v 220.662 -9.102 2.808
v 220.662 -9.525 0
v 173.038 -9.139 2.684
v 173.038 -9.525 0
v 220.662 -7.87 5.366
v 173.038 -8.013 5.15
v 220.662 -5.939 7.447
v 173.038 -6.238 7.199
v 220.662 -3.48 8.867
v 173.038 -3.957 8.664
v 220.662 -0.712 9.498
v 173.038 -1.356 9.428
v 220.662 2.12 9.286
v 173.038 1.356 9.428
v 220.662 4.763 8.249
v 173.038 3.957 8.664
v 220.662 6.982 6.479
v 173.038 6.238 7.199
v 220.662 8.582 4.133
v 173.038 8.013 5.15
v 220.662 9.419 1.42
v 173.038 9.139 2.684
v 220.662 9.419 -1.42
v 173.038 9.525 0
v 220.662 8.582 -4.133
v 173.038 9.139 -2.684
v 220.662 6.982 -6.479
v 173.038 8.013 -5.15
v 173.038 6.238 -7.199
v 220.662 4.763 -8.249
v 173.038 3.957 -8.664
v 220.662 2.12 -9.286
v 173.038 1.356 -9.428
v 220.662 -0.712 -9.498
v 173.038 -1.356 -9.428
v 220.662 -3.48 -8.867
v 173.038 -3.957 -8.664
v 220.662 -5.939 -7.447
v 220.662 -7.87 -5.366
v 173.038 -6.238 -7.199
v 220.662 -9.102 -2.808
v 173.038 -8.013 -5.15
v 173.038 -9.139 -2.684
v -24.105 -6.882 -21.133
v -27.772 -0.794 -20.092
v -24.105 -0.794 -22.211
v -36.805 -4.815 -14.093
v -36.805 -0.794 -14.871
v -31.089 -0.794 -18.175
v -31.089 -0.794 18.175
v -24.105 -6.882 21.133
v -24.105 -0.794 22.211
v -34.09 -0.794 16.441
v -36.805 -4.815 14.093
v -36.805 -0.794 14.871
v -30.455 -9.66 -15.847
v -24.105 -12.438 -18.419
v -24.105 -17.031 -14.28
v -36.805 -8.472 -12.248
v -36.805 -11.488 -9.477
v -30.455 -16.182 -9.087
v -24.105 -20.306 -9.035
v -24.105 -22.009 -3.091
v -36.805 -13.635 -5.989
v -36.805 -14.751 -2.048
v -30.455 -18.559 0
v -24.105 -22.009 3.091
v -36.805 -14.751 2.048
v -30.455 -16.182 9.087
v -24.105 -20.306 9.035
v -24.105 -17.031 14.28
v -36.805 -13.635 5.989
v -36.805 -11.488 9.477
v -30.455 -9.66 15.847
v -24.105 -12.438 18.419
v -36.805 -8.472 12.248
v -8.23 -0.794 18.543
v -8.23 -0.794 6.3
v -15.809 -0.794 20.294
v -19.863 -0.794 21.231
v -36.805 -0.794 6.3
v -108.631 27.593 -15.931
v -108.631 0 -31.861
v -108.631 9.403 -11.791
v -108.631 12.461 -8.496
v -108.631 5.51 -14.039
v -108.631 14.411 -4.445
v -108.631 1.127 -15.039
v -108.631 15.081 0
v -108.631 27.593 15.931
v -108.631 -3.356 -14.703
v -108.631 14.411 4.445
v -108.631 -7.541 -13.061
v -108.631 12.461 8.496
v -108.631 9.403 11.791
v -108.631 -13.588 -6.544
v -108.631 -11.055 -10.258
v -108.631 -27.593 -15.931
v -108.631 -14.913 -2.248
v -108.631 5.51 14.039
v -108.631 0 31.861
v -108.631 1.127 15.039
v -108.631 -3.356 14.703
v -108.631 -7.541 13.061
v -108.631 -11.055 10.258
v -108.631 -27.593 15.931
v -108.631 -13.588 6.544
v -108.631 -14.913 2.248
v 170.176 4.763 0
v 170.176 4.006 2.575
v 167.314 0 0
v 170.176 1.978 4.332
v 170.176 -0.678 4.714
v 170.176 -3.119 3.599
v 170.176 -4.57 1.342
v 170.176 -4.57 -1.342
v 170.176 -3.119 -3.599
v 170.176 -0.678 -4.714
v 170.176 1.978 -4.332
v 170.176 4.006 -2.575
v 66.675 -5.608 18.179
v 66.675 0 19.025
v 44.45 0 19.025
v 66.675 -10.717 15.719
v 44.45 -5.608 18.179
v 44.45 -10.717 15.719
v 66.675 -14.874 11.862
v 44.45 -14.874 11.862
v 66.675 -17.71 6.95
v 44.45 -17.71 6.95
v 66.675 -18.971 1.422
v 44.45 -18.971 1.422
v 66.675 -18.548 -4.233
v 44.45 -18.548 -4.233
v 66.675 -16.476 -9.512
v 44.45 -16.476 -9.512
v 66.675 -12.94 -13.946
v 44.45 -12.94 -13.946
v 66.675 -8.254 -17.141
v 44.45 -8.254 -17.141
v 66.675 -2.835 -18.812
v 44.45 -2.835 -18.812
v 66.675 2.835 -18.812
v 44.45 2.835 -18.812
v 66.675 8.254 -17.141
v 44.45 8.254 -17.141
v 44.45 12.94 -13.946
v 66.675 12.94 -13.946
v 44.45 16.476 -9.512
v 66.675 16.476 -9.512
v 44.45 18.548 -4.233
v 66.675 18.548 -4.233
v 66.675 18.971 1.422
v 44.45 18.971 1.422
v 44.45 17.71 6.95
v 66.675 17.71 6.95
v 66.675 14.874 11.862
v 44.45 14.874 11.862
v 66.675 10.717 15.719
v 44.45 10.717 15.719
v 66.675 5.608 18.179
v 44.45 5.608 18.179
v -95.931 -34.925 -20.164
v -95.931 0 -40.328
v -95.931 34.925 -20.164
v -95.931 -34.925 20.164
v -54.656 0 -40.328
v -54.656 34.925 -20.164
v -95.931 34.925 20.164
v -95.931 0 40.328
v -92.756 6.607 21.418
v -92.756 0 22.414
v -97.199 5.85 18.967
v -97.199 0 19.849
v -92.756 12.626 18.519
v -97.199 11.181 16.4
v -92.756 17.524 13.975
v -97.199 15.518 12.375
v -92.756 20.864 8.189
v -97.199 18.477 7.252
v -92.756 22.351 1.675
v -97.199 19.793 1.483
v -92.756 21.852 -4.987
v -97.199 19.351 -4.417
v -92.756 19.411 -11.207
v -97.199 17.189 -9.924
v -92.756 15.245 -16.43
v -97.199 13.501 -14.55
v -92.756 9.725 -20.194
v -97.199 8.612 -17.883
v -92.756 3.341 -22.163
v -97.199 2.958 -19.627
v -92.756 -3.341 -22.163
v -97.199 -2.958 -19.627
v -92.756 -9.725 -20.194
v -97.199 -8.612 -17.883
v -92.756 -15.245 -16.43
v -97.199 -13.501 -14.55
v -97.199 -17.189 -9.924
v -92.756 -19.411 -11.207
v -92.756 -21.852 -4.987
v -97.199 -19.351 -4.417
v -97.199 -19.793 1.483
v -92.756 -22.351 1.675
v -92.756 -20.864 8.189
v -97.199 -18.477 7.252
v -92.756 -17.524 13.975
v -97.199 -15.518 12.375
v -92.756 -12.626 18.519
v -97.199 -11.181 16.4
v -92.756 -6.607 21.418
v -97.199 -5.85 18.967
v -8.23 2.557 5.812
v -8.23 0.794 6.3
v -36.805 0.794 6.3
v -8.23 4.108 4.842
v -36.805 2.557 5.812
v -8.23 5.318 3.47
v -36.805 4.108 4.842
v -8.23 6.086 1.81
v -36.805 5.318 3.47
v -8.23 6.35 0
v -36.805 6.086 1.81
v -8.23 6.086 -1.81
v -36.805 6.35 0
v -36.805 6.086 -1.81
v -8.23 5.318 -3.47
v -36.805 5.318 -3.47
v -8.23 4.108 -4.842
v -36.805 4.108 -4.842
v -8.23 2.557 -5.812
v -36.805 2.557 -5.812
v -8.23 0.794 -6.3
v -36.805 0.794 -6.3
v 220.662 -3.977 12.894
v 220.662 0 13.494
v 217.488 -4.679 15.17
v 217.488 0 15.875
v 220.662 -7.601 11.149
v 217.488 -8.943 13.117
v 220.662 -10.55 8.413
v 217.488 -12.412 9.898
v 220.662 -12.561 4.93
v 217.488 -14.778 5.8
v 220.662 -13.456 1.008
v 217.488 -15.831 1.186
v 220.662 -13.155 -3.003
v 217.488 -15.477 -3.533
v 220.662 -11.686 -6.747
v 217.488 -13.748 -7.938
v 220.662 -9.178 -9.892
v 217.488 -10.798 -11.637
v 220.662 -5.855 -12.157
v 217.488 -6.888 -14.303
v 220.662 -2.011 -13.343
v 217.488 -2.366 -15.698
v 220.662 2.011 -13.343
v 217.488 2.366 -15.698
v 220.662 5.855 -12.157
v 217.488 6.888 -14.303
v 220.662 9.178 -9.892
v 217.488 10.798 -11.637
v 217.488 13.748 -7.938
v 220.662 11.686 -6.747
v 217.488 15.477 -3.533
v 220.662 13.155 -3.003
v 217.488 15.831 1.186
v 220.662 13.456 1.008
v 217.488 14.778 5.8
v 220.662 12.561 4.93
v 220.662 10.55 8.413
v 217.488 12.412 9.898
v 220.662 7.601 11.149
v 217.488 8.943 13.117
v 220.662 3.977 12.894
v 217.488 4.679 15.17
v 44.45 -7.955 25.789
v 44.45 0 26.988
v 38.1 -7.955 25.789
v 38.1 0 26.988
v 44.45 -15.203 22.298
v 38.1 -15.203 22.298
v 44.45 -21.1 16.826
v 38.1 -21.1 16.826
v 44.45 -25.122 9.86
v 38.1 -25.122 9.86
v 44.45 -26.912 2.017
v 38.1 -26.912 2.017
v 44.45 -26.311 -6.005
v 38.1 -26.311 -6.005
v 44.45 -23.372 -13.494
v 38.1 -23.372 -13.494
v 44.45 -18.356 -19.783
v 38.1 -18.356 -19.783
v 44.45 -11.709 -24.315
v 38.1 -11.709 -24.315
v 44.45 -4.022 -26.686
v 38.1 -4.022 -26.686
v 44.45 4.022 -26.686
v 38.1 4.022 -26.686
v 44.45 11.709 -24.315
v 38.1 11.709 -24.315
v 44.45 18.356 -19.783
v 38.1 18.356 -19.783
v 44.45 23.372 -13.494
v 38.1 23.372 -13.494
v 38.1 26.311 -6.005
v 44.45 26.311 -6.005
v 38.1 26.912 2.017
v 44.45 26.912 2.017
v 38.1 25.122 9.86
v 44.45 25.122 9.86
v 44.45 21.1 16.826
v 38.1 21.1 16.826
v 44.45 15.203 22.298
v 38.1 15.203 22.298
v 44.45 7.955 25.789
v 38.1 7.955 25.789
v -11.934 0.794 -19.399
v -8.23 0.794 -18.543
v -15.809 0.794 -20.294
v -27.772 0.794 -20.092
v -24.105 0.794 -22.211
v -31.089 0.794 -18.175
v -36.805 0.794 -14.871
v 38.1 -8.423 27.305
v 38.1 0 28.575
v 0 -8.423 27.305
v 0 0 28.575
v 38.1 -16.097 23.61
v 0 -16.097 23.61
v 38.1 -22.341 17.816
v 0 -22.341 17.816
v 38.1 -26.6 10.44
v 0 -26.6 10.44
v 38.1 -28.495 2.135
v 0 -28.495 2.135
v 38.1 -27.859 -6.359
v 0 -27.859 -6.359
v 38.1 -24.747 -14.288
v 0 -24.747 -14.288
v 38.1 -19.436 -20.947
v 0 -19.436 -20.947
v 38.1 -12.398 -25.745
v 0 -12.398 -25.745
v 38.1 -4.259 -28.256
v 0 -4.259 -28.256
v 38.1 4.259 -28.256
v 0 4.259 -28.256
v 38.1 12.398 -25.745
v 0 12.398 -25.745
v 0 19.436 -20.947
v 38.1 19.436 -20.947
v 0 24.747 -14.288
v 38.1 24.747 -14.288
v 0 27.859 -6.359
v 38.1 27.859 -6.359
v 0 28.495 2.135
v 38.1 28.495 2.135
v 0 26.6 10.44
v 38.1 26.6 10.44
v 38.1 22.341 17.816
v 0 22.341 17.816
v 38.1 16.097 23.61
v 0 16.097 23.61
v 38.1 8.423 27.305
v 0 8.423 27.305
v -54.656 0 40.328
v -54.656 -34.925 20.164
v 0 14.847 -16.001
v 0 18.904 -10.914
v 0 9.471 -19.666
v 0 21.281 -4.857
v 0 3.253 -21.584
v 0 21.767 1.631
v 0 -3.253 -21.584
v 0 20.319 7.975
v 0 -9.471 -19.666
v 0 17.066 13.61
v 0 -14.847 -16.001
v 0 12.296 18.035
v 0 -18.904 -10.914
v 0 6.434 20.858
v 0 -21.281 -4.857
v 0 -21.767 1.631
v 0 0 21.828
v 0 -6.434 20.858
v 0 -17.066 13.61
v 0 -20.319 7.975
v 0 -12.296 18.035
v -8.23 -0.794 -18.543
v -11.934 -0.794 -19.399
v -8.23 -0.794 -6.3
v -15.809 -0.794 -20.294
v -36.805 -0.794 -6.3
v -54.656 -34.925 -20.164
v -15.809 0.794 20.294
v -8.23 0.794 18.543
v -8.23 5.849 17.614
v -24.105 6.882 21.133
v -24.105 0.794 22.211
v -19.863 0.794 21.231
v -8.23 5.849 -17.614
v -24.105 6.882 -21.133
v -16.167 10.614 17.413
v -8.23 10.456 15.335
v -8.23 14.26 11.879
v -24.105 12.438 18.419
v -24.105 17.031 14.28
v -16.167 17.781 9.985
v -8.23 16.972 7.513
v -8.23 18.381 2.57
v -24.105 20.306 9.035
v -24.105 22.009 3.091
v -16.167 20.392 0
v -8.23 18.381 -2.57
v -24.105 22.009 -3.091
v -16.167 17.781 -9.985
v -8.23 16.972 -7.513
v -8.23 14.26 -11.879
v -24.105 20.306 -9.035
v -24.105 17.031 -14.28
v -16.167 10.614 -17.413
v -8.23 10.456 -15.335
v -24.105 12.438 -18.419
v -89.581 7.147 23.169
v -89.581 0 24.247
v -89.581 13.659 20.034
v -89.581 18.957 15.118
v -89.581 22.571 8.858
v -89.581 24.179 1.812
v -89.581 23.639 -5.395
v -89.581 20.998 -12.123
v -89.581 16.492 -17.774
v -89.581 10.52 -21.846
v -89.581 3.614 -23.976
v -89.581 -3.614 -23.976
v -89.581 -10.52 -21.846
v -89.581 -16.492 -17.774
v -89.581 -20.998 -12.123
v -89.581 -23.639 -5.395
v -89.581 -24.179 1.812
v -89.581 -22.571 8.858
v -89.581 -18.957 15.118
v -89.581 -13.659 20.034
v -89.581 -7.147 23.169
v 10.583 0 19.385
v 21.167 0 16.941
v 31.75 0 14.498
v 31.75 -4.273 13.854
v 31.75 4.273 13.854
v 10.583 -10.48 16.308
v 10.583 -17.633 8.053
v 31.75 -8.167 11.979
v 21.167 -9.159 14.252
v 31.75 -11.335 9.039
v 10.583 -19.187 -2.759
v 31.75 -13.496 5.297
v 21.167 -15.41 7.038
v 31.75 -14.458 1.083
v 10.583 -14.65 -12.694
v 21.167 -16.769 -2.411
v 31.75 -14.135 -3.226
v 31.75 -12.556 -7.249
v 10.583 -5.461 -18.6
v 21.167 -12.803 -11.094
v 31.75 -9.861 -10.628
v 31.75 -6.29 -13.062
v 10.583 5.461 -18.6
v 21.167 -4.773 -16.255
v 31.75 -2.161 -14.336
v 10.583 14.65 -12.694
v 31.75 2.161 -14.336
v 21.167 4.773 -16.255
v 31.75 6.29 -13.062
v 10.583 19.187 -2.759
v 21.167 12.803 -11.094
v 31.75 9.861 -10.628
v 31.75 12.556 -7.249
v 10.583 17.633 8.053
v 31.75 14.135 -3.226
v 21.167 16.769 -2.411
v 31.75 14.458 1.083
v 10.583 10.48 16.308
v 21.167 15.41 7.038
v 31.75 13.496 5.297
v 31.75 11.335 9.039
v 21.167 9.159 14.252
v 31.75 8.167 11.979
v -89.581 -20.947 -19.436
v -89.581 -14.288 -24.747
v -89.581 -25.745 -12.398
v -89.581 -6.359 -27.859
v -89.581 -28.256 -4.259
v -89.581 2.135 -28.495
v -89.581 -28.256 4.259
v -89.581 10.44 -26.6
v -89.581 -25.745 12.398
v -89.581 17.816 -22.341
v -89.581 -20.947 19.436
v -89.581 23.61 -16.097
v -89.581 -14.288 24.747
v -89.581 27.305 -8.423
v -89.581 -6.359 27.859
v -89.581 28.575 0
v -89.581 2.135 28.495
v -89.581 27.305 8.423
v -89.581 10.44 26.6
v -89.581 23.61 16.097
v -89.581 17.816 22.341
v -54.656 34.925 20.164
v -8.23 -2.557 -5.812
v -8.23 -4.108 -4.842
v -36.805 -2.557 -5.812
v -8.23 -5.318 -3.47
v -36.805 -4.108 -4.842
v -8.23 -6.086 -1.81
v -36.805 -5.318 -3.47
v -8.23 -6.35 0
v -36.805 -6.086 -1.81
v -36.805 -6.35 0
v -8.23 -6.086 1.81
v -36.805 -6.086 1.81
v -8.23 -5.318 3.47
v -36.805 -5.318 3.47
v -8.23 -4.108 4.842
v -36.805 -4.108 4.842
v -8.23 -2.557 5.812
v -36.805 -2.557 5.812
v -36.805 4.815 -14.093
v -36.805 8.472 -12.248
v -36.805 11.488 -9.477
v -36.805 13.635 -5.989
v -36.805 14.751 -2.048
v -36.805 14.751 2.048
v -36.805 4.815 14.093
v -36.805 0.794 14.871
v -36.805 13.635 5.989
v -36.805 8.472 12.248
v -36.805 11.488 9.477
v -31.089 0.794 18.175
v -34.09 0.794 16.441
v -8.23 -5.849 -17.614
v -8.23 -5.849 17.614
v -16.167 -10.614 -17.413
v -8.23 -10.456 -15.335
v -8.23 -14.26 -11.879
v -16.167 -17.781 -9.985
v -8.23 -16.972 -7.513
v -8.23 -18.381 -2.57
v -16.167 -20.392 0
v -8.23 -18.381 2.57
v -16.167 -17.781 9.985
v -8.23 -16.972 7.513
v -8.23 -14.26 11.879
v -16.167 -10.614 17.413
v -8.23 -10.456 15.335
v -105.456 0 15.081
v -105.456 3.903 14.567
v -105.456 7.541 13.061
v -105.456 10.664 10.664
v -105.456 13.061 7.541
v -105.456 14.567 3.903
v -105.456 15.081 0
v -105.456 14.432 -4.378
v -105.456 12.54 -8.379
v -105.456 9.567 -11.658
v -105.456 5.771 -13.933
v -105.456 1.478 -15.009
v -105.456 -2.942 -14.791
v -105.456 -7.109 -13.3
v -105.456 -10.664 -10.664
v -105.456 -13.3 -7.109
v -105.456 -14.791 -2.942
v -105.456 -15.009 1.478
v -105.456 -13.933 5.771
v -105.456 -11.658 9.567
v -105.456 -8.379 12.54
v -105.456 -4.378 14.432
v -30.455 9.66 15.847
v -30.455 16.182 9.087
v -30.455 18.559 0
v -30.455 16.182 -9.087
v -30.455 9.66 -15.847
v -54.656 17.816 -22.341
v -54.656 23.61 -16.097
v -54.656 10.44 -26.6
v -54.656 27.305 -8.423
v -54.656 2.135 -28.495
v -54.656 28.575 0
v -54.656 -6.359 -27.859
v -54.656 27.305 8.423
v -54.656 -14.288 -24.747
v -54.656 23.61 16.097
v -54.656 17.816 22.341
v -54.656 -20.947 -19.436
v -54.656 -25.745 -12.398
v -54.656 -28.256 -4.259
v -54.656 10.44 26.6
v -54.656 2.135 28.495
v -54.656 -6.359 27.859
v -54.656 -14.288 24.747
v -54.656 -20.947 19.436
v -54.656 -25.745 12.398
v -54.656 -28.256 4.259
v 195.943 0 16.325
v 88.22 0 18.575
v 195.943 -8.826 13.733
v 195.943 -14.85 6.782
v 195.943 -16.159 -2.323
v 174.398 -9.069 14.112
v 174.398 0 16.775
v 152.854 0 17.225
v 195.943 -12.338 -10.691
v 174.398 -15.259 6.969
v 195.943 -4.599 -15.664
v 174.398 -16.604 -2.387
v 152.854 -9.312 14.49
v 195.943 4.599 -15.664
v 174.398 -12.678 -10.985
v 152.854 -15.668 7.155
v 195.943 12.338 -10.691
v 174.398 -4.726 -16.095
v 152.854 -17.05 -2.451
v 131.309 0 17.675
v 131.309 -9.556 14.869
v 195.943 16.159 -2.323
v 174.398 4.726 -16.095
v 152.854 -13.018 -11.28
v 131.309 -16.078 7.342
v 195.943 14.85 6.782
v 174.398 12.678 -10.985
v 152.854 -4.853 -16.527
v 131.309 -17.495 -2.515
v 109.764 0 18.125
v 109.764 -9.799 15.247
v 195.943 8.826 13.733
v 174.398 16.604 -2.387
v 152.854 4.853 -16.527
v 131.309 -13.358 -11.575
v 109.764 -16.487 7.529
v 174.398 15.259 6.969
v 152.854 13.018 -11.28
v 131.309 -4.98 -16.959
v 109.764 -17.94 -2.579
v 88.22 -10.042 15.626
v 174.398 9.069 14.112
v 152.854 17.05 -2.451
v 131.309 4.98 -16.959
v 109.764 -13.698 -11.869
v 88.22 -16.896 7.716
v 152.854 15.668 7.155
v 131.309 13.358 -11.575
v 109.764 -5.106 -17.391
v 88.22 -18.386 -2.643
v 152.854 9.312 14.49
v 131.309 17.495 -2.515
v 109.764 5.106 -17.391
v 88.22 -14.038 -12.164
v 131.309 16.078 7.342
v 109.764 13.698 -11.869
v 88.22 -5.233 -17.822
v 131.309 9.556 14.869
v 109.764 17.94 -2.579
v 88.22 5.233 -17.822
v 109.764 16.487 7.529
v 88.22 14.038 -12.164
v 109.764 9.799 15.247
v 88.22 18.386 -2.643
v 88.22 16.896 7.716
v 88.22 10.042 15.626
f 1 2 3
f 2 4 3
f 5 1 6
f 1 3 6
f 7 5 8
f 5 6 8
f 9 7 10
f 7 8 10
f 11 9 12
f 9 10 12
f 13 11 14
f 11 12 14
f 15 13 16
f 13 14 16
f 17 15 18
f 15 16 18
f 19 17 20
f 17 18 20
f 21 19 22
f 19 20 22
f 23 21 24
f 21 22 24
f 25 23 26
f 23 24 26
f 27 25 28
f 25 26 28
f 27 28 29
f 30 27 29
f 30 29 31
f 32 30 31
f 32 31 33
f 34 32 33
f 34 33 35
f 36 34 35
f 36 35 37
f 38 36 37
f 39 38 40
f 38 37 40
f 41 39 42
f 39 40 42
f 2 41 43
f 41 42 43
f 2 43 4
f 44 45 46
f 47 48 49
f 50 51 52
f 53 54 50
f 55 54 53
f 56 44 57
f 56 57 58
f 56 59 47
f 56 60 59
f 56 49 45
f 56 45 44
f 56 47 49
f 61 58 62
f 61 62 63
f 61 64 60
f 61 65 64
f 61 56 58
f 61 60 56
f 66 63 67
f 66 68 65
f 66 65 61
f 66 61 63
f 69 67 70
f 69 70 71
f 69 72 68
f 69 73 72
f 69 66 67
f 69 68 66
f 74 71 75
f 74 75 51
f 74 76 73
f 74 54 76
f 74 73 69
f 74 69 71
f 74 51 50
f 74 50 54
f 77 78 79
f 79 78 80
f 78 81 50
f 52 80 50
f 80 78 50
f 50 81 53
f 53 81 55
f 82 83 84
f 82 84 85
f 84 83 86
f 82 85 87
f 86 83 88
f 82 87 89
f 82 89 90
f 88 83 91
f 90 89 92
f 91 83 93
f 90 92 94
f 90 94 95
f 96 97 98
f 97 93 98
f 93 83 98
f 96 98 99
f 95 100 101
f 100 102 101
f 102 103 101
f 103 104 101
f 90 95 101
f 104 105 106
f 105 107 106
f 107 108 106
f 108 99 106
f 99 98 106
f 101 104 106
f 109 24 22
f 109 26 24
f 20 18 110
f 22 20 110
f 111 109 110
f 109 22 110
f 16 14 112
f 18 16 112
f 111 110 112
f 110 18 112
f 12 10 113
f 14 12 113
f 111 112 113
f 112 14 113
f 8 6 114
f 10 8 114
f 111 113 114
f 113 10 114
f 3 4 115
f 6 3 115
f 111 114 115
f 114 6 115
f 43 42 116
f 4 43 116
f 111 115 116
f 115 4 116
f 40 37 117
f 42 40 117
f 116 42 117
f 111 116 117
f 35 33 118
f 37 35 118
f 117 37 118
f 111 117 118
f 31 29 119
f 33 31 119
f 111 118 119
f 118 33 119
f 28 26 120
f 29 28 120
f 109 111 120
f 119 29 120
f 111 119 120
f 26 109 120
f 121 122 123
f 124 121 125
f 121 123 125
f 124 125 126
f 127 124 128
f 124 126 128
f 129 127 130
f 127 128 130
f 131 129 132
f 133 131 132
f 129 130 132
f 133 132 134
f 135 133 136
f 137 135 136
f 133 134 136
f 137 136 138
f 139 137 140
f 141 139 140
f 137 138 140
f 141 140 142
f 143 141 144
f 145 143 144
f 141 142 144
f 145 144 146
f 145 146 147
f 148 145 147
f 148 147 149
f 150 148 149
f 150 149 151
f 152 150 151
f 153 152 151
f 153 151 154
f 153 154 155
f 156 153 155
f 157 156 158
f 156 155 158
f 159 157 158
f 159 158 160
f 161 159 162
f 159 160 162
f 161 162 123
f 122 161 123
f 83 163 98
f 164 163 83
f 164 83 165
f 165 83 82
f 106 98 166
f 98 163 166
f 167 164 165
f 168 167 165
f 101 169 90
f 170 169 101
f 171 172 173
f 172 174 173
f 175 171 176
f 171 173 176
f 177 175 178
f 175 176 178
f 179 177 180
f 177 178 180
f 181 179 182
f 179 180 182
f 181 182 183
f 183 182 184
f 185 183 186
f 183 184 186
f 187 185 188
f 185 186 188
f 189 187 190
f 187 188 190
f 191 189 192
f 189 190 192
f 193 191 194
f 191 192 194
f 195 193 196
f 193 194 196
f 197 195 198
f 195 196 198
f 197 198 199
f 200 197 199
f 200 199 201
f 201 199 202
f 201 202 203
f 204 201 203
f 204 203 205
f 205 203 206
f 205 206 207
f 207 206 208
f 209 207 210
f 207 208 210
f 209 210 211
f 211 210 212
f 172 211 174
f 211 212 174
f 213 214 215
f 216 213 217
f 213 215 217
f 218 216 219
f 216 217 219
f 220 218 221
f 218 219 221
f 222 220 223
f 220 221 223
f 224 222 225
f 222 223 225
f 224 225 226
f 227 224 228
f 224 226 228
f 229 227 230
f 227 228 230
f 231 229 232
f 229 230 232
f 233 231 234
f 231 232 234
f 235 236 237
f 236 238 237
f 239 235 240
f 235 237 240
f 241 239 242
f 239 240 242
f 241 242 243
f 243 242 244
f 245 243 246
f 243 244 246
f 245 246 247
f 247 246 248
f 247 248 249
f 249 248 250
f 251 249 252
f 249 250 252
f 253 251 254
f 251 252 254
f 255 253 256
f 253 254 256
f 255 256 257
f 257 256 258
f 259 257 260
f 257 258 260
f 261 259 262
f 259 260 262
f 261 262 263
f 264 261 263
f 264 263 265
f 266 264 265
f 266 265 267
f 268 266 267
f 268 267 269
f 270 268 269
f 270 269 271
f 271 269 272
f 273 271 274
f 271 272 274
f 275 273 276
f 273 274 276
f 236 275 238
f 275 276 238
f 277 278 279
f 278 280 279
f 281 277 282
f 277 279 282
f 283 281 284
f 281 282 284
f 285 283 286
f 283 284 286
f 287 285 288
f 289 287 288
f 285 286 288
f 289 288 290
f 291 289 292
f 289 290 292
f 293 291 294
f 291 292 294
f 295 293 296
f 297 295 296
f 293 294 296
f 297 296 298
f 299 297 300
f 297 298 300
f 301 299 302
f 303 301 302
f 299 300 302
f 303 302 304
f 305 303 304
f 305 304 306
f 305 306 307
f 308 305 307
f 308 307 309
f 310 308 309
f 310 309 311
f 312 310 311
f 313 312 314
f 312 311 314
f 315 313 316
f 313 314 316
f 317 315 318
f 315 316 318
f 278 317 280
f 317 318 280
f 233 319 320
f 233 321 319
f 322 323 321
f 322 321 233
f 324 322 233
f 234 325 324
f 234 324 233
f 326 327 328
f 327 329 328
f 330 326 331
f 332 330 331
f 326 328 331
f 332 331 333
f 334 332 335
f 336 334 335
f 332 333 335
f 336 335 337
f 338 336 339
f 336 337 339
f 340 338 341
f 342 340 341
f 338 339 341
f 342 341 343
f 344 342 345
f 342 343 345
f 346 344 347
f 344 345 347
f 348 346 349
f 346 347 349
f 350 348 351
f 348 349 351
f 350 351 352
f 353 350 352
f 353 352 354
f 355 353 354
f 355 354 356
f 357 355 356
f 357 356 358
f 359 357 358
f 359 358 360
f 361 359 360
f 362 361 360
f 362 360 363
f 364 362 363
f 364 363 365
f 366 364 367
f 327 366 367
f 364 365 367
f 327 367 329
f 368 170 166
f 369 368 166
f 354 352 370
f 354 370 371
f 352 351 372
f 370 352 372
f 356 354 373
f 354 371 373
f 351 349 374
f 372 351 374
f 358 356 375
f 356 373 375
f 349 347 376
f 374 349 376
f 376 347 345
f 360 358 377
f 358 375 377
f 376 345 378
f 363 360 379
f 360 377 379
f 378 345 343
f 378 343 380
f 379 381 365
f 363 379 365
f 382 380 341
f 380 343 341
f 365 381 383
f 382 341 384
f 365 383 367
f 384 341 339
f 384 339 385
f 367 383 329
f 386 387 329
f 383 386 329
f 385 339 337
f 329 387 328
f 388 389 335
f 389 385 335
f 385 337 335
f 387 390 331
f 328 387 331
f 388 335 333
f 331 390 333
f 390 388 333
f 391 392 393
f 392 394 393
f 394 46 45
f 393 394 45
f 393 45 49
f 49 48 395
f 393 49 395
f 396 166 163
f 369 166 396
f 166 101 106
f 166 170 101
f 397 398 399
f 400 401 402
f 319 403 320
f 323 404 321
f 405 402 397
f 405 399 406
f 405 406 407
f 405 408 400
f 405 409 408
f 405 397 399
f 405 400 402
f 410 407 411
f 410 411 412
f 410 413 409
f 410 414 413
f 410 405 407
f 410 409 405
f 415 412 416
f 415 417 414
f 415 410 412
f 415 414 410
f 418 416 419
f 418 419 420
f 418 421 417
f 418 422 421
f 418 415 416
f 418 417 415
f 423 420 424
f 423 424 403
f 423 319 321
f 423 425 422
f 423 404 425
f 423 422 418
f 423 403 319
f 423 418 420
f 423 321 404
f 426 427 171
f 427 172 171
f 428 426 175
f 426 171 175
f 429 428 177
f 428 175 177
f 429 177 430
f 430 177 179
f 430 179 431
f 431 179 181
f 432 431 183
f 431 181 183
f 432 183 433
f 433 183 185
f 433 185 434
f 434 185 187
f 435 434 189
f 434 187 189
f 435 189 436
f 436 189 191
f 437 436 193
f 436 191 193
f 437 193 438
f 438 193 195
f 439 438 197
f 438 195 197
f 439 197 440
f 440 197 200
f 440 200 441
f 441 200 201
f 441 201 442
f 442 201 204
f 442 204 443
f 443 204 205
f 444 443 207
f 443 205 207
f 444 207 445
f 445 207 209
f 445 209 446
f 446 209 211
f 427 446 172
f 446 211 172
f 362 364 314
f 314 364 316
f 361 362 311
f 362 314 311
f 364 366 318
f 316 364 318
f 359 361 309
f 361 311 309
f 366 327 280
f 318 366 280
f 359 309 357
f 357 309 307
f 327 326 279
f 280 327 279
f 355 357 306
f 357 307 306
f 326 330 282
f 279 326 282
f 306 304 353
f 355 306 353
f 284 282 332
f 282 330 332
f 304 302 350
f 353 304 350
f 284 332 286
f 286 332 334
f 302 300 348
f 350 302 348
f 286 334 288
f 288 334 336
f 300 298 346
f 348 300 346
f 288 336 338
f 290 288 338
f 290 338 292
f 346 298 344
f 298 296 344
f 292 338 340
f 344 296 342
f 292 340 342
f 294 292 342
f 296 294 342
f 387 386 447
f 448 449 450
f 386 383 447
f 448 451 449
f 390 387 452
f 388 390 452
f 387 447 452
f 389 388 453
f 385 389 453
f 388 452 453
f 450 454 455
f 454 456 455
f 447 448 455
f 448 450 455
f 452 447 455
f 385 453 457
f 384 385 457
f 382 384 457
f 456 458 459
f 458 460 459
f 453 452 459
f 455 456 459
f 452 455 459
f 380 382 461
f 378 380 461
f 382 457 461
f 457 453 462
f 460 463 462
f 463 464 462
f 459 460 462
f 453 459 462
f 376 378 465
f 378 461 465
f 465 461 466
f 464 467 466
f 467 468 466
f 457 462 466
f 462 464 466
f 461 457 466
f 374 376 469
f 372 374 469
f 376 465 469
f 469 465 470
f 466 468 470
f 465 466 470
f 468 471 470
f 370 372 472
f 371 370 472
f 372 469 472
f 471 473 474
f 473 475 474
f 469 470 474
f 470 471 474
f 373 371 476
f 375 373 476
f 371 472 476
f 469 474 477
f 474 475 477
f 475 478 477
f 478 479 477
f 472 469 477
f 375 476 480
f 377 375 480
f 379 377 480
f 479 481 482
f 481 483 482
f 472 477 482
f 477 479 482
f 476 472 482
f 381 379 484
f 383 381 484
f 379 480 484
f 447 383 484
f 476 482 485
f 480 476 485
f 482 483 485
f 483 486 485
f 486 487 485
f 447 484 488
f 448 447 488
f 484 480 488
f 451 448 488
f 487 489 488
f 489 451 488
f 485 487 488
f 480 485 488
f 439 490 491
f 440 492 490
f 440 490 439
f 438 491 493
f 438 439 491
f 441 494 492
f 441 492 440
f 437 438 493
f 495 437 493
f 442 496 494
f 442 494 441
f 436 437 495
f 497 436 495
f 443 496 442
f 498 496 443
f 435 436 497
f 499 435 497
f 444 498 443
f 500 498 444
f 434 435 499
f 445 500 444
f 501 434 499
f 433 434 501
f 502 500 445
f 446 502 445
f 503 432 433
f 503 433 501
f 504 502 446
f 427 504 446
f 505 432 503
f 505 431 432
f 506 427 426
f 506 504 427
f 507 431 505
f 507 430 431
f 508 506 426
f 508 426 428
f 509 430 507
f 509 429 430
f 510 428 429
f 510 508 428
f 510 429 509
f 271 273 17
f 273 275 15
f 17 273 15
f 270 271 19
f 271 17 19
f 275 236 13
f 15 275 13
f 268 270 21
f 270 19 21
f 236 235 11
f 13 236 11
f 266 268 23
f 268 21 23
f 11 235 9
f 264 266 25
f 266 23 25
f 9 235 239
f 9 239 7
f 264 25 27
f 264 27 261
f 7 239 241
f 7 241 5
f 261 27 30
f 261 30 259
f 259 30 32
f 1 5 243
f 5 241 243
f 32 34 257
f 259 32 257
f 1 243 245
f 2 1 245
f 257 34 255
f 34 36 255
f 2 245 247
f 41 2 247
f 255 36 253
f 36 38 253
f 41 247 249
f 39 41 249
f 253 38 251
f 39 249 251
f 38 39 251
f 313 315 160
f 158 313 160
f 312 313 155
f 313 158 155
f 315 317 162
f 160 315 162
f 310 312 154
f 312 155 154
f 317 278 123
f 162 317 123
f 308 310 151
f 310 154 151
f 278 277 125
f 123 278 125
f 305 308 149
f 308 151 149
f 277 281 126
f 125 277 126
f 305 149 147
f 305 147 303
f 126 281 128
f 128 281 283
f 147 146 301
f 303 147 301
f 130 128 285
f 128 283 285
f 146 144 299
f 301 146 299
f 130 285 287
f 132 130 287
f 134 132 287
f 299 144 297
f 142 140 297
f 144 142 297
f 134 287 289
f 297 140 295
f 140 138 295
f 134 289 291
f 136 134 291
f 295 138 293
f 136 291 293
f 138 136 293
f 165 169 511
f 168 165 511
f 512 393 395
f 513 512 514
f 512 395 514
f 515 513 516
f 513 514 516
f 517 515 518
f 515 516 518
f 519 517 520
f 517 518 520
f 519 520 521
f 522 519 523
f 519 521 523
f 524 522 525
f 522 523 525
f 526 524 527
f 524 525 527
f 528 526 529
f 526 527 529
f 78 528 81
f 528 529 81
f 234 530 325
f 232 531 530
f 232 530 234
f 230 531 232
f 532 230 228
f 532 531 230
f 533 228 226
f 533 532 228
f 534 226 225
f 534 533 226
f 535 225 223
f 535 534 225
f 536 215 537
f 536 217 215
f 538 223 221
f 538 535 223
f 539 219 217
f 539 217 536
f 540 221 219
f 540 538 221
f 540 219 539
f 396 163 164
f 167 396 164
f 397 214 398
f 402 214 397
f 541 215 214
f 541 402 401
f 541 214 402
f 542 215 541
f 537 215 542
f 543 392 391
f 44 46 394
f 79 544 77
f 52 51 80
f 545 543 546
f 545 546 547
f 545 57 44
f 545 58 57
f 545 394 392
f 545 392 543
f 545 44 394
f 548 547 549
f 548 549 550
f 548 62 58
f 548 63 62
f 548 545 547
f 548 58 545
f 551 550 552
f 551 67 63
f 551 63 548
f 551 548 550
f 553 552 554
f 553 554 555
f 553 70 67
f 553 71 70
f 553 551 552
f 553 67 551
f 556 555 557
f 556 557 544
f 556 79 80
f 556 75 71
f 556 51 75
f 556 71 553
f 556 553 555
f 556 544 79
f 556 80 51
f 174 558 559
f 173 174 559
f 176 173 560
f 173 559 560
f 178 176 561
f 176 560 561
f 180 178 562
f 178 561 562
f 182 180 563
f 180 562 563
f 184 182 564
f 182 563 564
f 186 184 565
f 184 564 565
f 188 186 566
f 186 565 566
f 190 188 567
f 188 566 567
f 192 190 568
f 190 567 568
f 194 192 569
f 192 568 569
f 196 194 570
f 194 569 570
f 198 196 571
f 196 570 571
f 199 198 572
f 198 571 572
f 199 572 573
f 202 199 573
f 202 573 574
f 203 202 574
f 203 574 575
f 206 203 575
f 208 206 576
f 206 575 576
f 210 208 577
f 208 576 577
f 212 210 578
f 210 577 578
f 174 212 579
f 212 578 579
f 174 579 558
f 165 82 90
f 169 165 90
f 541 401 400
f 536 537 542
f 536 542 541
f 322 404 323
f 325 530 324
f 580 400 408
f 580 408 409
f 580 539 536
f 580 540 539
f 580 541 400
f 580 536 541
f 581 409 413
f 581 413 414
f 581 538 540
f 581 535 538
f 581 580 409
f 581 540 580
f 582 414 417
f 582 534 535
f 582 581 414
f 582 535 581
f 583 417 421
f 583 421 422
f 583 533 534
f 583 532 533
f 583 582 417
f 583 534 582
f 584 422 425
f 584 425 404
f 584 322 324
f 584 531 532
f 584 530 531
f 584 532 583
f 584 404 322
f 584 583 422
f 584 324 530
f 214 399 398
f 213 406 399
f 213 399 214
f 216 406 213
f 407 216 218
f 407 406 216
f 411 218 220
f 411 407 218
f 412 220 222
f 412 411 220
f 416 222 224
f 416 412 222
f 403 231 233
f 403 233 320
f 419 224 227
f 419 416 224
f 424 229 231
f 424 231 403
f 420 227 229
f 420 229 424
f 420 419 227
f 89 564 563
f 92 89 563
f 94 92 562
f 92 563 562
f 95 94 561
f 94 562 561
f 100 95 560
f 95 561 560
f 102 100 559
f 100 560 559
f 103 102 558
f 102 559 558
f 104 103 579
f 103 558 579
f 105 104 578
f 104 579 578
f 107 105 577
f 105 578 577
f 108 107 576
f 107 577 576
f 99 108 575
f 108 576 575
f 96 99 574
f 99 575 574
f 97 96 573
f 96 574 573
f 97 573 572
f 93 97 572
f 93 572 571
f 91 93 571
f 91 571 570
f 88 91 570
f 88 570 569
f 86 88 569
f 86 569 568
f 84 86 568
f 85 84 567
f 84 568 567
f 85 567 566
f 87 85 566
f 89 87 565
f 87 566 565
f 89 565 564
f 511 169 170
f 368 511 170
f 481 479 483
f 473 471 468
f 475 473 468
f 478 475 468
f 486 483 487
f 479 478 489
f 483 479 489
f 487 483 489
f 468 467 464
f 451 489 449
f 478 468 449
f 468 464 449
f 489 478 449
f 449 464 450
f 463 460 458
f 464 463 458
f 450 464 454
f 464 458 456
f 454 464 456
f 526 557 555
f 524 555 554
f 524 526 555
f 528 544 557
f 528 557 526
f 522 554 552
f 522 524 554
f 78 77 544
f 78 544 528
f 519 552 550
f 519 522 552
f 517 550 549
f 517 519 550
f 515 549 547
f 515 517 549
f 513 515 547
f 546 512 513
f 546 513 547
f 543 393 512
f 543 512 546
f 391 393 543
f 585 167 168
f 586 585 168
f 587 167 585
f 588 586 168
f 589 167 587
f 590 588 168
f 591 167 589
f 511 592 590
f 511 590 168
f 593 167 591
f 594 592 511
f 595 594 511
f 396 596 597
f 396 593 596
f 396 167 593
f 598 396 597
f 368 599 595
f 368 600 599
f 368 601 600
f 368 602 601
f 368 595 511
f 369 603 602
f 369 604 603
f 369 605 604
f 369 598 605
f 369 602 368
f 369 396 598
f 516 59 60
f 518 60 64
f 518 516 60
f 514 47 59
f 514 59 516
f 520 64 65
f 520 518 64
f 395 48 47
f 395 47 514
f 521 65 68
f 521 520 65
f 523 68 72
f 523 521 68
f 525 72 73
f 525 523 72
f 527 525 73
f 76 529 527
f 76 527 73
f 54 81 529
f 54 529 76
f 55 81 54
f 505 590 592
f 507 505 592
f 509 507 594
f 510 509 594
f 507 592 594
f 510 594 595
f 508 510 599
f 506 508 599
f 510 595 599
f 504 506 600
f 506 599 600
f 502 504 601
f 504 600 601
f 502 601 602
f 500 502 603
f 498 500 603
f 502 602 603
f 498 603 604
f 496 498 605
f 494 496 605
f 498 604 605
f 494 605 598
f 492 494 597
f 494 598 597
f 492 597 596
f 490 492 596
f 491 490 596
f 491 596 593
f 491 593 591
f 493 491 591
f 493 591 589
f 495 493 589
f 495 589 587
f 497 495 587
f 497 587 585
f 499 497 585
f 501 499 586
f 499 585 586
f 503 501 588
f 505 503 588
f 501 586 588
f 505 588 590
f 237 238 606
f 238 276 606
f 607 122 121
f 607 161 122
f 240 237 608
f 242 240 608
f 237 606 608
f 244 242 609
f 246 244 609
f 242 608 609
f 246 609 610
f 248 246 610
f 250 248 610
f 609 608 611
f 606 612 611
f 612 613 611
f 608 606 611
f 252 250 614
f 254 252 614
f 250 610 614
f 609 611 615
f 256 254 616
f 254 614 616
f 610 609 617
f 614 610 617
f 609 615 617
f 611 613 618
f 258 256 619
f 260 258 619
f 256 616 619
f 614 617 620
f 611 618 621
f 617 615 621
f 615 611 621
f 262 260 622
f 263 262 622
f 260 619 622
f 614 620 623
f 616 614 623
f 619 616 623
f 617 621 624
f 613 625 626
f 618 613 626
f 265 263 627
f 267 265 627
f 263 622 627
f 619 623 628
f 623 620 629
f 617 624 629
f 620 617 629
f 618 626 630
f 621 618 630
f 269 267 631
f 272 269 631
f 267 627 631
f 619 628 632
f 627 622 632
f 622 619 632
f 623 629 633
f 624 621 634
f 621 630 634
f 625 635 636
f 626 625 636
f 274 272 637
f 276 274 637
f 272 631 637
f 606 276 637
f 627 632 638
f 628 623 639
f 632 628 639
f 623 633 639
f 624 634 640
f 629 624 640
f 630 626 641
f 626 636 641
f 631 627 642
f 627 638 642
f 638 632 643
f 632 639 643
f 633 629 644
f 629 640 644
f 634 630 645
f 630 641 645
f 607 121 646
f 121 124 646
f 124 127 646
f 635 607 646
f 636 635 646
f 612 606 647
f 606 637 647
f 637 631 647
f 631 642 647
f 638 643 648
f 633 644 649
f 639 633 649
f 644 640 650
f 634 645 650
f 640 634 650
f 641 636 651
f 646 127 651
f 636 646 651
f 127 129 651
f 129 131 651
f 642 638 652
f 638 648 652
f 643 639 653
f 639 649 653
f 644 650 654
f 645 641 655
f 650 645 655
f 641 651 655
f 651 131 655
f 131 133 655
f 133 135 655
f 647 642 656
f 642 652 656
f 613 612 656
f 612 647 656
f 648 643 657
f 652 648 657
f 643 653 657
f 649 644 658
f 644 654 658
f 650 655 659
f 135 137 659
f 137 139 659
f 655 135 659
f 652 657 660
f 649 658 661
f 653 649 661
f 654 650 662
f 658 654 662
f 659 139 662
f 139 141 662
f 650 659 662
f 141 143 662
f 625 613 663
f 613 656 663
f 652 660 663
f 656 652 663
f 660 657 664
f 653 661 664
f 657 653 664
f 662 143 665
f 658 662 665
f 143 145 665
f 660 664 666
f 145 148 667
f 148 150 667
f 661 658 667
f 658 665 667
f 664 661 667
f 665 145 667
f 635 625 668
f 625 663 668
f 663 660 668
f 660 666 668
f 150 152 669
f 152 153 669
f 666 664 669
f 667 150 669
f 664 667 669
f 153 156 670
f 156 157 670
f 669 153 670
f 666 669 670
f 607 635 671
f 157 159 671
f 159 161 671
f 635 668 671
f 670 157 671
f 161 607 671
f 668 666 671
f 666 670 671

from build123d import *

# Parameters (mm, degrees)
F3_D         = 19.05
F3_DEPTH     = 47.625
F3_TIP       = 5.7231973962
F6_R         = 6.35
F7_DEPTH     = 44.45
F8_W         = 1.5875
F8_H         = 50.8
F9_DEPTH     = 50.8
F10_W        = 53.975
F10_H        = 88.9
F11_DEPTH    = 34.925
F13_DEPTH    = 53.975
F14_C1_SIZE2 = 7.3323484187
F14_C1_SIZE  = 12.7
F14_C2_SIZE2 = 7.3323484187
F14_C2_SIZE  = 12.7
F14_C3_SIZE2 = 12.7
F14_C3_SIZE  = 7.3323484187
F14_C4_SIZE2 = 12.7
F14_C4_SIZE  = 7.3323484187
F14_C5_SIZE2 = 12.7
F14_C5_SIZE  = 7.3323484187
F14_C6_SIZE2 = 12.7
F14_C6_SIZE  = 7.3323484187
F15_R        = 15.08125
F16_DEPTH    = 53.976
F17_R        = 28.575
F18_DEPTH    = 34.925


with BuildPart() as f1:
    # F0 (on Front) → F1 (revolve)
    with BuildSketch(Plane.XZ):
        Polygon((38.1, 26.9875), (38.1, 0), (44.45, 0), (44.45, 19.0246), (44.45, 26.9875), align=None)
        Polygon((31.75, 14.4980599318), (31.75, 0), (38.1, 0), (38.1, 26.9875), (38.1, 28.575), (0, 28.575), (0, 21.828125), align=None)
        Polygon((44.45, 19.0246), (44.45, 0), (217.4875, 0), (220.6625, 0), (220.6625, 13.49375), (217.4875, 15.875), (66.675, 19.0246), align=None)
    revolve(axis=Axis((130.96875, 0, 0), (1, 0, 0)))

    # F3
    with Locations(Plane.YZ.offset(220.6625)):
        with Locations((0, 0)):
            Hole(F3_D / 2, depth=F3_DEPTH)
            with Locations((0, 0, -(F3_DEPTH + F3_TIP / 2))):  # 118° drill point
                Cone(0, F3_D / 2, F3_TIP, mode=Mode.SUBTRACT)


with BuildPart() as f5:
    # F4 (on Front) → F5 (revolve)
    with BuildSketch(Plane.XZ):
        Polygon((-24.1045645936, 0), (-8.2295645936, 0), (-8.2295645936, 7.1290070594), (-8.2295645936, 18.5599674659), (-24.1045645936, 22.225), (-36.8045645936, 14.8926515813), (-36.8045645936, 0), align=None)
    revolve(axis=Axis((-30.4545645936, 0, 0), (-1, 0, 0)))

    # F6 (on face) → F7 (cut)
    with BuildSketch(Plane(origin=(-36.8045645936, 0, 0), x_dir=(0, -1, 0), z_dir=(-1, 0, 0))):
        Circle(F6_R)
    extrude(amount=-F7_DEPTH, mode=Mode.SUBTRACT)

    # F8 (on face) → F9 (cut)
    with BuildSketch(Plane(origin=(-36.8045645936, 0, 0), x_dir=(0, -1, 0), z_dir=(-1, 0, 0))):
        Rectangle(F8_W, F8_H)
    extrude(amount=-F9_DEPTH, mode=Mode.SUBTRACT)


with BuildPart() as f11:
    # F10 (on Front) → F11 (new body, symmetric)
    with BuildSketch(Plane.XZ):
        with Locations((-81.6434432337, 0)):
            Rectangle(F10_W, F10_H)
    extrude(amount=F11_DEPTH, both=True)

    # F12 (on face) → F13 (cut)
    with BuildSketch(Plane(origin=(-108.6309432337, 0, 0), x_dir=(0, -1, 0), z_dir=(-1, 0, 0))):
        Polygon((0, 40.3279163029), (34.925, 20.1639581514), (34.925, 44.45), (-34.925, 44.45), (-34.925, 20.1639581514), align=None)
        Polygon((34.925, -44.45), (34.925, -20.1639581514), (0, -40.3279163029), (-34.925, -20.1639581514), (-34.925, -44.45), align=None)
    extrude(amount=-F13_DEPTH, mode=Mode.SUBTRACT)

    # F14: chamfer of 12.7 x 7.3323484187 on 6 edges, made by hand

    # F14_c1
    f14_c1_edges = [f11.edges().sort_by_distance(p)[0] for p in [
        (-108.6309432337, 34.925, 0),
    ]]
    f14_c1_side = f11.faces().sort_by_distance((-108.4842962653, 34.925, 0))[0]
    chamfer(f14_c1_edges, length=F14_C1_SIZE, length2=F14_C1_SIZE2, reference=f14_c1_side)

    # F14_c2
    f14_c2_edges = [f11.edges().sort_by_distance(p)[0] for p in [
        (-108.6309432337, 13.7963257906, -32.3626038938),
    ]]
    f14_c2_side = f11.faces().sort_by_distance((-108.4842962653, 13.7963257906, -32.3626038938))[0]
    chamfer(f14_c2_edges, length=F14_C2_SIZE, length2=F14_C2_SIZE2, reference=f14_c2_side)

    # F14_c3
    f14_c3_edges = [f11.edges().sort_by_distance(p)[0] for p in [
        (-108.6309432337, 13.7963257906, 32.3626038938),
    ]]
    f14_c3_side = f11.faces().sort_by_distance((-108.6309432337, 13.7230023065, 32.2356038938))[0]
    chamfer(f14_c3_edges, length=F14_C3_SIZE, length2=F14_C3_SIZE2, reference=f14_c3_side)

    # F14_c4
    f14_c4_edges = [f11.edges().sort_by_distance(p)[0] for p in [
        (-108.6309432337, -21.1286742094, 28.1292705605),
    ]]
    f14_c4_side = f11.faces().sort_by_distance((-108.6309432337, -21.0553507252, 28.0022705605))[0]
    chamfer(f14_c4_edges, length=F14_C4_SIZE, length2=F14_C4_SIZE2, reference=f14_c4_side)

    # F14_c5
    f14_c5_edges = [f11.edges().sort_by_distance(p)[0] for p in [
        (-108.6309432337, -34.925, -4.2333333333),
    ]]
    f14_c5_side = f11.faces().sort_by_distance((-108.6309432337, -34.7783530316, -4.2333333333))[0]
    chamfer(f14_c5_edges, length=F14_C5_SIZE, length2=F14_C5_SIZE2, reference=f14_c5_side)

    # F14_c6
    f14_c6_edges = [f11.edges().sort_by_distance(p)[0] for p in [
        (-108.6309432337, -17.4625, -30.2459372272),
    ]]
    f14_c6_side = f11.faces().sort_by_distance((-108.6309432337, -17.3891765158, -30.1189372272))[0]
    chamfer(f14_c6_edges, length=F14_C6_SIZE, length2=F14_C6_SIZE2, reference=f14_c6_side)

    # F15 (on face) → F16 (cut, through all)
    with BuildSketch(Plane.YZ.offset(-54.6559432337)):
        Circle(F15_R)
    extrude(amount=-F16_DEPTH, mode=Mode.SUBTRACT)

    # F17 (on face) → F18 (cut)
    with BuildSketch(Plane.YZ.offset(-54.6559432337)):
        Circle(F17_R)
    extrude(amount=-F18_DEPTH, mode=Mode.SUBTRACT)

    # F19 (on Front) → F20 (revolve, cut)
    with BuildSketch(Plane.XZ):
        Polygon((-92.7559432337, 15.08125), (-105.4559432337, 15.08125), (-105.4559432337, 0), (-92.7559432337, 0), (-87.1003866196, 0), (-87.1003866196, 15.08125), align=None)
        Polygon((-97.1985902505, 19.8486349676), (-105.4559432337, 15.08125), (-92.7559432337, 15.08125), (-92.7559432337, 22.4135984187), align=None)
        Polygon((-92.7559432337, 22.4135984187), (-92.7559432337, 15.08125), (-87.1003866196, 15.08125), (-87.1003866196, 22.4286857992), (-87.1003866196, 25.6788355523), align=None)
    revolve(axis=Axis((-96.2781649266, 0, 0), (-1, 0, 0)), mode=Mode.SUBTRACT)


solid = Compound([f1.part, f5.part, f11.part])
